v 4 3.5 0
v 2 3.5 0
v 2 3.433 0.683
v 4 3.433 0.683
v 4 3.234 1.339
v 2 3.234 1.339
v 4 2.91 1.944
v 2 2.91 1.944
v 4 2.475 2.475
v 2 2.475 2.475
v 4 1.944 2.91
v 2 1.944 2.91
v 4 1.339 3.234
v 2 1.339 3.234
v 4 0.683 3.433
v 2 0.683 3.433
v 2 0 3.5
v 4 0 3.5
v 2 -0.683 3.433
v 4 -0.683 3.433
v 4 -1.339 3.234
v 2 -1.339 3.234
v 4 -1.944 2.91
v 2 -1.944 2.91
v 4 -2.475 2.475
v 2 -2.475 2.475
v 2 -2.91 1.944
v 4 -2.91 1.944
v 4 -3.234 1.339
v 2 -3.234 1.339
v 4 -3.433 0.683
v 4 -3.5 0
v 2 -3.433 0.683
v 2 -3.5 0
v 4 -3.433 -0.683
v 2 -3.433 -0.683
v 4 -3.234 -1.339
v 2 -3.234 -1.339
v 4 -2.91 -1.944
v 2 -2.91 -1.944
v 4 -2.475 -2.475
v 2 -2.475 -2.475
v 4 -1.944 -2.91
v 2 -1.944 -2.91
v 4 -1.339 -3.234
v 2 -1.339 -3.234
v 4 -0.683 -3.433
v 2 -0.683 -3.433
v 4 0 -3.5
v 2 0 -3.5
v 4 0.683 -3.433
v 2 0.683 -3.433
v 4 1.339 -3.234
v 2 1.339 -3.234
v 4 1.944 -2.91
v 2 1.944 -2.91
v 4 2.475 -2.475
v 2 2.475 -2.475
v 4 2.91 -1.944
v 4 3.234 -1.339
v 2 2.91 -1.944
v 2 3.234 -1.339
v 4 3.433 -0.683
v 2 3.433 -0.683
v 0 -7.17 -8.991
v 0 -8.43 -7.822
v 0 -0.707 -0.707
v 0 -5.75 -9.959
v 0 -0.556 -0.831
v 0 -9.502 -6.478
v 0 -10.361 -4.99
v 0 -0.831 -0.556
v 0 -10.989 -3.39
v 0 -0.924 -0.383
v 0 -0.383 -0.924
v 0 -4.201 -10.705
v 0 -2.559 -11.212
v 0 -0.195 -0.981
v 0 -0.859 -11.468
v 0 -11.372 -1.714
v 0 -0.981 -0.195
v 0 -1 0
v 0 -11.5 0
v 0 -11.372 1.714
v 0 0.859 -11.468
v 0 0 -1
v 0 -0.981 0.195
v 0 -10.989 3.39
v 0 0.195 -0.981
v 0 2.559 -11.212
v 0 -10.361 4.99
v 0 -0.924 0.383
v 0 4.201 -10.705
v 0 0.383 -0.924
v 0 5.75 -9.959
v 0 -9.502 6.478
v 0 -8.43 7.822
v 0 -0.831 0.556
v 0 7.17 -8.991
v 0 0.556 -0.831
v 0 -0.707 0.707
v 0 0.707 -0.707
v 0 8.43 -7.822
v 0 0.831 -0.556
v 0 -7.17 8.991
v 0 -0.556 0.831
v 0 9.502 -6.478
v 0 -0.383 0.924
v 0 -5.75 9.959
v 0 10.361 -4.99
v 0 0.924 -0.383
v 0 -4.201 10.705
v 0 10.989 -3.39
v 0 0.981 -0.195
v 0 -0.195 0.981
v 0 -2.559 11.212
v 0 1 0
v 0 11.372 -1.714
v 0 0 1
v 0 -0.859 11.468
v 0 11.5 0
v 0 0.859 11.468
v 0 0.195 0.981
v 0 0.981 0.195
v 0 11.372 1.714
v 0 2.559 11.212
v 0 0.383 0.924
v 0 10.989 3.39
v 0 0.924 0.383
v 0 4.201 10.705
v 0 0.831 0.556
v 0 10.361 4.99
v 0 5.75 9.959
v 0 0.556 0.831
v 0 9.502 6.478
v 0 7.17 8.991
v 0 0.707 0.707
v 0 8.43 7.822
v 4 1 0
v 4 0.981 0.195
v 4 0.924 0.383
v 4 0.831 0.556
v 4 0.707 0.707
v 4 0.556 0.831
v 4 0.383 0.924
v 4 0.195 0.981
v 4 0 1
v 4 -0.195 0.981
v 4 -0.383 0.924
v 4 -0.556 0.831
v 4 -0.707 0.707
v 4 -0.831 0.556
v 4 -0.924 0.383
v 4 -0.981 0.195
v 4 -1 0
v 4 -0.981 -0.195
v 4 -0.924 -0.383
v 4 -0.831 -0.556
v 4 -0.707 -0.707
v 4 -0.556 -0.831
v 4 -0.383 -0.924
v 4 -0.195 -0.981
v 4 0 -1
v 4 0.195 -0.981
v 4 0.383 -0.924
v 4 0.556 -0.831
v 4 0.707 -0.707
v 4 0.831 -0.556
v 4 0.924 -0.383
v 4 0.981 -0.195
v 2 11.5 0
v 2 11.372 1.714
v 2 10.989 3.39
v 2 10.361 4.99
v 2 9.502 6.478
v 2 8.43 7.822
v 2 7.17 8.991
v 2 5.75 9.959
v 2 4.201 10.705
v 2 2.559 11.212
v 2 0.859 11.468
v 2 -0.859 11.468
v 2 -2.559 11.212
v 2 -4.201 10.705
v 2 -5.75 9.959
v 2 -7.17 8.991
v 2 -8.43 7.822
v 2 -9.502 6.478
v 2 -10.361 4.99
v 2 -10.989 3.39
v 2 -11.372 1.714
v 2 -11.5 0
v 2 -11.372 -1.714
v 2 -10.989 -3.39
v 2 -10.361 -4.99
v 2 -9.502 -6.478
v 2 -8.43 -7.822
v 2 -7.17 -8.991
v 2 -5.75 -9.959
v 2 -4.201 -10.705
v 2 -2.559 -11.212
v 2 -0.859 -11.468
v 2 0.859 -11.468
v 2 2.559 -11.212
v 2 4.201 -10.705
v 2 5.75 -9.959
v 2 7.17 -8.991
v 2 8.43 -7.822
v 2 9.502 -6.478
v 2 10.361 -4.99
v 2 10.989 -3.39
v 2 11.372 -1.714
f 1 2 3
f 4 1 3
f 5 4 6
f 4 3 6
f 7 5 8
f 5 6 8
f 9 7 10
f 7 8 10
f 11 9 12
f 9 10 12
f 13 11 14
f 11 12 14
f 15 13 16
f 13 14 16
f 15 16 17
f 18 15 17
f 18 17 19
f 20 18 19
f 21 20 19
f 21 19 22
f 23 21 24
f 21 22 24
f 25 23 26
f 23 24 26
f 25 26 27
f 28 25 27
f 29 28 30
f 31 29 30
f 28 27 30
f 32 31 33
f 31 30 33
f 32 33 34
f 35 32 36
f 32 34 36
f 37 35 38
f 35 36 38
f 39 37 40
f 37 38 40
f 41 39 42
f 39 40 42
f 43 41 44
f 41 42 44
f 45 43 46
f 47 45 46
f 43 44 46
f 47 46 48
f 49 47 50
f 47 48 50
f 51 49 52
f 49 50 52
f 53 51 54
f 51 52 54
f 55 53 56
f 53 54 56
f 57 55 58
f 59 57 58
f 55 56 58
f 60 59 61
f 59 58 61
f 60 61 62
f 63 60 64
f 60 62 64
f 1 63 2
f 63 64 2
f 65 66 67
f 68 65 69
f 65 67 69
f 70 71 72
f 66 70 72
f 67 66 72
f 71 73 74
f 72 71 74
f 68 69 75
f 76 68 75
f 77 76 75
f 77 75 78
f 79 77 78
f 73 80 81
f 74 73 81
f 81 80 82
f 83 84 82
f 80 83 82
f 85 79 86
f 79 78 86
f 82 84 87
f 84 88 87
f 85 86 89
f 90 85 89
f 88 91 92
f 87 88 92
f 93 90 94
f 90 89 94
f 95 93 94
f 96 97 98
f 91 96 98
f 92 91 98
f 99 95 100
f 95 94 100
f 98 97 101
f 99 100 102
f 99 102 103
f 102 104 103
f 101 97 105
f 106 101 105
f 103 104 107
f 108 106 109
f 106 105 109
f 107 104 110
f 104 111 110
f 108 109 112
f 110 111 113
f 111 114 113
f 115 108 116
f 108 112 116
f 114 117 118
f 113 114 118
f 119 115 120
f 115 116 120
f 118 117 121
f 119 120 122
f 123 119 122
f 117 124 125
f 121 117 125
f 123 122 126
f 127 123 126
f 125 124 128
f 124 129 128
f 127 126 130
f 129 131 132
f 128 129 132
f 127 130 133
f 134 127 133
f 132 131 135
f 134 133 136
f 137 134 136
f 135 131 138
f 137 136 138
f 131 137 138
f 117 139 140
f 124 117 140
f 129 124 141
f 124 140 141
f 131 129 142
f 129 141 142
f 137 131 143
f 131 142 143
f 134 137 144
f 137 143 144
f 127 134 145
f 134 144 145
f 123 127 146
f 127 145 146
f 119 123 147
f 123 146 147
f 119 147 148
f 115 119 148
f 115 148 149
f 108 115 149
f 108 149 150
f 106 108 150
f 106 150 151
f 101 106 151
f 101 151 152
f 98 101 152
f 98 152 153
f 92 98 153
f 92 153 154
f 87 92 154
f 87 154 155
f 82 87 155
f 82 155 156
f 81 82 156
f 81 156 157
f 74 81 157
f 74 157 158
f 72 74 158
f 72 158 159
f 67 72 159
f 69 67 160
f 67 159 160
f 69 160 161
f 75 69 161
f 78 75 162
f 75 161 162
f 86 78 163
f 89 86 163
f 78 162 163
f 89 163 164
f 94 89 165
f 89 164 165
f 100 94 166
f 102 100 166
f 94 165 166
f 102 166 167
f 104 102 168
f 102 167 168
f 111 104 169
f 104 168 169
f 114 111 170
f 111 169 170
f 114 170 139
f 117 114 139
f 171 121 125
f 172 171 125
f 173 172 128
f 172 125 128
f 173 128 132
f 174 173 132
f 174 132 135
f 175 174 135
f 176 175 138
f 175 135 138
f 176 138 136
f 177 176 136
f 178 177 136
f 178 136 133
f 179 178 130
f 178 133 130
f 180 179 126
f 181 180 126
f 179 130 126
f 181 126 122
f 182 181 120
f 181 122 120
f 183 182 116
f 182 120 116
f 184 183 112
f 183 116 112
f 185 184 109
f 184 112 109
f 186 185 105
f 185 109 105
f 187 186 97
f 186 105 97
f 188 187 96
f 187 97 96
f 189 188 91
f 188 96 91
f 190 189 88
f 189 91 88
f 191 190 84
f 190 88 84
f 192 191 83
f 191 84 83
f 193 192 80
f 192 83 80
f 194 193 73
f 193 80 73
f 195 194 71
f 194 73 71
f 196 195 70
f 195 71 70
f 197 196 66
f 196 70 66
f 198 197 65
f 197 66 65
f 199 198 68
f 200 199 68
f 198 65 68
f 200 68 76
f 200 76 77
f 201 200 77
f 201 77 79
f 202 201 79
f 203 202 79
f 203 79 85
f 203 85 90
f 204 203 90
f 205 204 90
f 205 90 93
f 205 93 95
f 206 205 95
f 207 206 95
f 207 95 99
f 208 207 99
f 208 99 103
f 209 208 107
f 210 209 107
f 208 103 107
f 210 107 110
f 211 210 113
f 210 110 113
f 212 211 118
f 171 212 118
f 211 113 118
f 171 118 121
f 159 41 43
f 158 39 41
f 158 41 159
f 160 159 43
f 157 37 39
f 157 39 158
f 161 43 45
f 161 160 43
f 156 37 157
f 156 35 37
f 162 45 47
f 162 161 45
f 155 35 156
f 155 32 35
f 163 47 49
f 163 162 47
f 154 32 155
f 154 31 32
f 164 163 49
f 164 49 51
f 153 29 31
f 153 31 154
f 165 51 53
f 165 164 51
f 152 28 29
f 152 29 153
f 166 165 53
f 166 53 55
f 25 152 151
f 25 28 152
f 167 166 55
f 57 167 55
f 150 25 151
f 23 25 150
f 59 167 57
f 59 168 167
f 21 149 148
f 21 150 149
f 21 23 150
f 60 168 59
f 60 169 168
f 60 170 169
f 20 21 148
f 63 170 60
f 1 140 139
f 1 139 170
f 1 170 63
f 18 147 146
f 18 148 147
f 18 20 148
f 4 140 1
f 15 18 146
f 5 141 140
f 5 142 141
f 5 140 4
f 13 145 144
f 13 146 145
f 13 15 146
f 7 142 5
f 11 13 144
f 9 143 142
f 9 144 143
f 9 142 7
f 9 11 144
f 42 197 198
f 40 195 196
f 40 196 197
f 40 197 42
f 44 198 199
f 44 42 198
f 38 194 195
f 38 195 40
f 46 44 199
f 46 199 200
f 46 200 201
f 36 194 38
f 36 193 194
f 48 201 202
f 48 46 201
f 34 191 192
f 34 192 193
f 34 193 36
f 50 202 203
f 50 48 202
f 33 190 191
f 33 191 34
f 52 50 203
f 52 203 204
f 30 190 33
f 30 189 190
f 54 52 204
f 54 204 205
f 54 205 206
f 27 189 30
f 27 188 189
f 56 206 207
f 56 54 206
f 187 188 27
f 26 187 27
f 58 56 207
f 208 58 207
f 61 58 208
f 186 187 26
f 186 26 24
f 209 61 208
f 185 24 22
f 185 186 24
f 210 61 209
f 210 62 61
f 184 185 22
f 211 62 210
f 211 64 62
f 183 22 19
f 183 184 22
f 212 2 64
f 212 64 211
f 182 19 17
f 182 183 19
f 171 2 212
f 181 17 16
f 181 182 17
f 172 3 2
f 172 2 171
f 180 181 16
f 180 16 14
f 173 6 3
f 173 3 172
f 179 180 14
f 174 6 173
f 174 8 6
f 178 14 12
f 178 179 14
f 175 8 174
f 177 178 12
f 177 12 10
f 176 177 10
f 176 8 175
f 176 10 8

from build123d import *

# Parameters (mm, degrees)
F0_R     = 11.5
F1_DEPTH = 2
F2_R     = 3.5
F3_DEPTH = 2
F4_R     = 1
F5_DEPTH = 4.001


with BuildPart() as f1:
    # F0 (on Right) → F1 (new body)
    with BuildSketch(Plane.YZ):
        Circle(F0_R)
    extrude(amount=F1_DEPTH)

    # F2 (on face) → F3 (join)
    with BuildSketch(Plane.YZ.offset(2)):
        Circle(F2_R)
    extrude(amount=F3_DEPTH)

    # F4 (on face) → F5 (cut, through all)
    with BuildSketch(Plane.YZ.offset(4)):
        Circle(F4_R)
    extrude(amount=-F5_DEPTH, mode=Mode.SUBTRACT)


solid = f1.part
